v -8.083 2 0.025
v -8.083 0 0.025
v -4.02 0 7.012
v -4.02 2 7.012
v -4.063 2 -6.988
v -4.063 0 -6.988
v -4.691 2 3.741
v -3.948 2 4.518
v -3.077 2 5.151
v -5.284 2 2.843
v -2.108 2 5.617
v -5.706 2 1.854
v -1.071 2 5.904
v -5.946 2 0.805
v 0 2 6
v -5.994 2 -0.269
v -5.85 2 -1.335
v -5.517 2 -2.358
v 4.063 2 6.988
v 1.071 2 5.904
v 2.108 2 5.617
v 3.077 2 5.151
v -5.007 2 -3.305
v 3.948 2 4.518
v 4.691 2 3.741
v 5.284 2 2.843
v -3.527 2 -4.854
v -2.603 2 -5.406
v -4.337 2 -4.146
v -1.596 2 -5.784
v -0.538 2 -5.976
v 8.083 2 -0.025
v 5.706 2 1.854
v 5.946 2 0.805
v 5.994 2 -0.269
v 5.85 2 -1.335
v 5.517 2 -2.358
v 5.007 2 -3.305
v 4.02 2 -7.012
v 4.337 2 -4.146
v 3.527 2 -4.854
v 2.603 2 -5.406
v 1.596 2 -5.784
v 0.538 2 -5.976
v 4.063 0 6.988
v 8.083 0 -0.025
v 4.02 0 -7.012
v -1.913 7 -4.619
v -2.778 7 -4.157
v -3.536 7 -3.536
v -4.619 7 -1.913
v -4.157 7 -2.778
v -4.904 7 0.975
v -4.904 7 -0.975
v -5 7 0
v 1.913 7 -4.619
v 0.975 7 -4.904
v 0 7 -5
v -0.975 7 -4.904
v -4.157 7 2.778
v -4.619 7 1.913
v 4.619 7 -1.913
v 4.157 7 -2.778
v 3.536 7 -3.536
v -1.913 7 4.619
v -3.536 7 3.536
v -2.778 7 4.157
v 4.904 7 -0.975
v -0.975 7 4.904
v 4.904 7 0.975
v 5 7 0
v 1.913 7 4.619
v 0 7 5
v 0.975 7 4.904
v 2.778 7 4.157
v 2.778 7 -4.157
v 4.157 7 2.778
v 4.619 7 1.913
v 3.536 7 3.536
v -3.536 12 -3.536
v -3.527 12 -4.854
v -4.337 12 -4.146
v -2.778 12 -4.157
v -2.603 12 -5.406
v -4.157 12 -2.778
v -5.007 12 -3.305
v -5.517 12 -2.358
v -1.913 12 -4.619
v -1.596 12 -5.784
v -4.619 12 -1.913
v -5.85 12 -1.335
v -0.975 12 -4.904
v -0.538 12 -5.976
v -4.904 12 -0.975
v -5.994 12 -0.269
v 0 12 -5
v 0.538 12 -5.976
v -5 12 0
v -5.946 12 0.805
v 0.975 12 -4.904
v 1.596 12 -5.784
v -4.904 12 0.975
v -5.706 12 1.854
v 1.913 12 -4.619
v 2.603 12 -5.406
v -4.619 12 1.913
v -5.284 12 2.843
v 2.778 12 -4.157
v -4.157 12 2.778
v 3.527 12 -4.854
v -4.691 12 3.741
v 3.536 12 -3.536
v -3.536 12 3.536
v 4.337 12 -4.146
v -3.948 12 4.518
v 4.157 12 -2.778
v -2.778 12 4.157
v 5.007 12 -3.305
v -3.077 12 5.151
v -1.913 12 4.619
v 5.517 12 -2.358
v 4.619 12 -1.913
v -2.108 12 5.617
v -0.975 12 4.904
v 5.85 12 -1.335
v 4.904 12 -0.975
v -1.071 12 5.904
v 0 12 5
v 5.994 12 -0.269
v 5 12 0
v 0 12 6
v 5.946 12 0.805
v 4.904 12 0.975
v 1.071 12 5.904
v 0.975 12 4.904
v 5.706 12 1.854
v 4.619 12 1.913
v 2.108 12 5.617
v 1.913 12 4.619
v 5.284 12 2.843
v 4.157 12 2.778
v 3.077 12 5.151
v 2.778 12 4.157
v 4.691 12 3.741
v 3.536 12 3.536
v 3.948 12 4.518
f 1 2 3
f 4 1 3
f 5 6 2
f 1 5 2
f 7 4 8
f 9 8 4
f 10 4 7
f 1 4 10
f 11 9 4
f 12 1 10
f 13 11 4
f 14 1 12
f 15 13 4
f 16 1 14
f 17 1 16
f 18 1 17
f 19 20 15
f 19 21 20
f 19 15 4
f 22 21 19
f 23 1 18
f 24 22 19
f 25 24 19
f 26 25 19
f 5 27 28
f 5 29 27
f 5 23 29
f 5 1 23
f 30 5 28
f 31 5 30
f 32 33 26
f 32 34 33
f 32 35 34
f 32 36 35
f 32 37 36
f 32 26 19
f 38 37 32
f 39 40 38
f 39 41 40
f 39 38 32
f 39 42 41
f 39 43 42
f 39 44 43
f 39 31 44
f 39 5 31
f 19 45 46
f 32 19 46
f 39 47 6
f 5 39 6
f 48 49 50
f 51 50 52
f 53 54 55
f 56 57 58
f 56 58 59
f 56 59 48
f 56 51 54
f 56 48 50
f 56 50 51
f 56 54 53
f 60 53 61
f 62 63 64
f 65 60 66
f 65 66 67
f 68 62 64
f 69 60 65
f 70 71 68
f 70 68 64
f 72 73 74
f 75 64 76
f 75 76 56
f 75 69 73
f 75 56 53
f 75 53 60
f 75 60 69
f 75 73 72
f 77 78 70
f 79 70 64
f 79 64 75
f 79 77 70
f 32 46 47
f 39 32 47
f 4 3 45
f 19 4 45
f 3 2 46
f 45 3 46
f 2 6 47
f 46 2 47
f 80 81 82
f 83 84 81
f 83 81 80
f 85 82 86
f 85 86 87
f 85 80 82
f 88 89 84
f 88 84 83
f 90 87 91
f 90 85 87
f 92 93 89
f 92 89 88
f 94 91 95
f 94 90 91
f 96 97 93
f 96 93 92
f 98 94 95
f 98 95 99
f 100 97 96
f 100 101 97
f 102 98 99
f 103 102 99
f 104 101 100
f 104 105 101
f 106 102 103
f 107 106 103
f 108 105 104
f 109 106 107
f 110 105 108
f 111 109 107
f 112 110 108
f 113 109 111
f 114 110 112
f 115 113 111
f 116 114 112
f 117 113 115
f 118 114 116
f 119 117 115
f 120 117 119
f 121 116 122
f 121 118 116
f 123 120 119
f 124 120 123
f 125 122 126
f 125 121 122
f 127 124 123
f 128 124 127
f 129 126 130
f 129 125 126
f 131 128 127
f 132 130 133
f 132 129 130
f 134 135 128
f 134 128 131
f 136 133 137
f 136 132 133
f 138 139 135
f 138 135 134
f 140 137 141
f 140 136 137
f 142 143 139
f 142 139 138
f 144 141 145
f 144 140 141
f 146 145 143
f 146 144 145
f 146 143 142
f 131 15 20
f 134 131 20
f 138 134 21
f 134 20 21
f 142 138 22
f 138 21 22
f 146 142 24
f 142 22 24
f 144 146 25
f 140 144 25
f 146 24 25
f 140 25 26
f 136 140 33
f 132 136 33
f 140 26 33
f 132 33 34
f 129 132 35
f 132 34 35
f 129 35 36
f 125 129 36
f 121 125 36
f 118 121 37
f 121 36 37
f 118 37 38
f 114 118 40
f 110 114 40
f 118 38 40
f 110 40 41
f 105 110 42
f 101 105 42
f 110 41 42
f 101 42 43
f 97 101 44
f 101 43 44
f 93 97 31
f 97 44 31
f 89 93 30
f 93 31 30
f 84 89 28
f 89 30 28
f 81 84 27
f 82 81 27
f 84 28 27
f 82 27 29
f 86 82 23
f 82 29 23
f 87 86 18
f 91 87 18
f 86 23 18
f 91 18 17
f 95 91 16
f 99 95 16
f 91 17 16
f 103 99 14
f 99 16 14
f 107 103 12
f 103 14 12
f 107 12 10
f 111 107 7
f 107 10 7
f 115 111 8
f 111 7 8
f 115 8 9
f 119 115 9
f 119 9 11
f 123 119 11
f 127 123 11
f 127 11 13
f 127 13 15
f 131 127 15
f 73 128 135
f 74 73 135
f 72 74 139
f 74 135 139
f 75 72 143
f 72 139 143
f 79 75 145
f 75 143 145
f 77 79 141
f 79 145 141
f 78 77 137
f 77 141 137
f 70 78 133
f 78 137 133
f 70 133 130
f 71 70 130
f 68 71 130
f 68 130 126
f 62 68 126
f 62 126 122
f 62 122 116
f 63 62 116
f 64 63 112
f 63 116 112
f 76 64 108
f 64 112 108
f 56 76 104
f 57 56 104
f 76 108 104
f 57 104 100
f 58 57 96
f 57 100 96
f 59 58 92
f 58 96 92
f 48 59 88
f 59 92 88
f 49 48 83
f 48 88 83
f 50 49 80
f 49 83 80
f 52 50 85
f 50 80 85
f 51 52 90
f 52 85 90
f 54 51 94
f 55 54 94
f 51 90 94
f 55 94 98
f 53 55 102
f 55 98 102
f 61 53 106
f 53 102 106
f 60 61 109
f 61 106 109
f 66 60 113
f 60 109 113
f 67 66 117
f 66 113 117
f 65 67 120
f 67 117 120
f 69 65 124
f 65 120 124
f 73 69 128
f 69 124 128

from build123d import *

# Parameters (mm, degrees)
EXTRUDE_1_DEPTH     = 2
SKETCH_2_R          = 6
EXTRUDE_2_DEPTH     = 10
SKETCH_3_R          = 5
CUT_EXTRUDE_1_DEPTH = 5


with BuildPart() as part:
    # ｽｹｯﾁ1 → ﾎﾞｽ - 押し出し1 (new body)
    with BuildSketch(Plane(origin=(0, 0, 0), x_dir=(1, 0, 0), z_dir=(0, 1, 0))):
        Polygon((4.062937169, -6.987551424), (8.082865627, 0.02483109), (4.019928459, 7.012382514), (-4.062937169, 6.987551424), (-8.082865627, -0.02483109), (-4.019928459, -7.012382514), align=None)
    extrude(amount=EXTRUDE_1_DEPTH)

    # ｽｹｯﾁ2 → ﾎﾞｽ - 押し出し2 (add)
    with BuildSketch(Plane(origin=(0, 2, 0), x_dir=(1, 0, 0), z_dir=(0, 1, 0))):
        with Locations(Location((0, 0, 0), (0, 0, 270))):
            Circle(SKETCH_2_R)
    extrude(amount=EXTRUDE_2_DEPTH)

    # ｽｹｯﾁ3 → ｶｯﾄ - 押し出し1 (cut)
    with BuildSketch(Plane(origin=(0, 12, 0), x_dir=(1, 0, 0), z_dir=(0, 1, 0))):
        with Locations(Location((0, 0, 0), (0, 0, 270))):
            Circle(SKETCH_3_R)
    extrude(amount=-CUT_EXTRUDE_1_DEPTH, mode=Mode.SUBTRACT)


solid = part.part
